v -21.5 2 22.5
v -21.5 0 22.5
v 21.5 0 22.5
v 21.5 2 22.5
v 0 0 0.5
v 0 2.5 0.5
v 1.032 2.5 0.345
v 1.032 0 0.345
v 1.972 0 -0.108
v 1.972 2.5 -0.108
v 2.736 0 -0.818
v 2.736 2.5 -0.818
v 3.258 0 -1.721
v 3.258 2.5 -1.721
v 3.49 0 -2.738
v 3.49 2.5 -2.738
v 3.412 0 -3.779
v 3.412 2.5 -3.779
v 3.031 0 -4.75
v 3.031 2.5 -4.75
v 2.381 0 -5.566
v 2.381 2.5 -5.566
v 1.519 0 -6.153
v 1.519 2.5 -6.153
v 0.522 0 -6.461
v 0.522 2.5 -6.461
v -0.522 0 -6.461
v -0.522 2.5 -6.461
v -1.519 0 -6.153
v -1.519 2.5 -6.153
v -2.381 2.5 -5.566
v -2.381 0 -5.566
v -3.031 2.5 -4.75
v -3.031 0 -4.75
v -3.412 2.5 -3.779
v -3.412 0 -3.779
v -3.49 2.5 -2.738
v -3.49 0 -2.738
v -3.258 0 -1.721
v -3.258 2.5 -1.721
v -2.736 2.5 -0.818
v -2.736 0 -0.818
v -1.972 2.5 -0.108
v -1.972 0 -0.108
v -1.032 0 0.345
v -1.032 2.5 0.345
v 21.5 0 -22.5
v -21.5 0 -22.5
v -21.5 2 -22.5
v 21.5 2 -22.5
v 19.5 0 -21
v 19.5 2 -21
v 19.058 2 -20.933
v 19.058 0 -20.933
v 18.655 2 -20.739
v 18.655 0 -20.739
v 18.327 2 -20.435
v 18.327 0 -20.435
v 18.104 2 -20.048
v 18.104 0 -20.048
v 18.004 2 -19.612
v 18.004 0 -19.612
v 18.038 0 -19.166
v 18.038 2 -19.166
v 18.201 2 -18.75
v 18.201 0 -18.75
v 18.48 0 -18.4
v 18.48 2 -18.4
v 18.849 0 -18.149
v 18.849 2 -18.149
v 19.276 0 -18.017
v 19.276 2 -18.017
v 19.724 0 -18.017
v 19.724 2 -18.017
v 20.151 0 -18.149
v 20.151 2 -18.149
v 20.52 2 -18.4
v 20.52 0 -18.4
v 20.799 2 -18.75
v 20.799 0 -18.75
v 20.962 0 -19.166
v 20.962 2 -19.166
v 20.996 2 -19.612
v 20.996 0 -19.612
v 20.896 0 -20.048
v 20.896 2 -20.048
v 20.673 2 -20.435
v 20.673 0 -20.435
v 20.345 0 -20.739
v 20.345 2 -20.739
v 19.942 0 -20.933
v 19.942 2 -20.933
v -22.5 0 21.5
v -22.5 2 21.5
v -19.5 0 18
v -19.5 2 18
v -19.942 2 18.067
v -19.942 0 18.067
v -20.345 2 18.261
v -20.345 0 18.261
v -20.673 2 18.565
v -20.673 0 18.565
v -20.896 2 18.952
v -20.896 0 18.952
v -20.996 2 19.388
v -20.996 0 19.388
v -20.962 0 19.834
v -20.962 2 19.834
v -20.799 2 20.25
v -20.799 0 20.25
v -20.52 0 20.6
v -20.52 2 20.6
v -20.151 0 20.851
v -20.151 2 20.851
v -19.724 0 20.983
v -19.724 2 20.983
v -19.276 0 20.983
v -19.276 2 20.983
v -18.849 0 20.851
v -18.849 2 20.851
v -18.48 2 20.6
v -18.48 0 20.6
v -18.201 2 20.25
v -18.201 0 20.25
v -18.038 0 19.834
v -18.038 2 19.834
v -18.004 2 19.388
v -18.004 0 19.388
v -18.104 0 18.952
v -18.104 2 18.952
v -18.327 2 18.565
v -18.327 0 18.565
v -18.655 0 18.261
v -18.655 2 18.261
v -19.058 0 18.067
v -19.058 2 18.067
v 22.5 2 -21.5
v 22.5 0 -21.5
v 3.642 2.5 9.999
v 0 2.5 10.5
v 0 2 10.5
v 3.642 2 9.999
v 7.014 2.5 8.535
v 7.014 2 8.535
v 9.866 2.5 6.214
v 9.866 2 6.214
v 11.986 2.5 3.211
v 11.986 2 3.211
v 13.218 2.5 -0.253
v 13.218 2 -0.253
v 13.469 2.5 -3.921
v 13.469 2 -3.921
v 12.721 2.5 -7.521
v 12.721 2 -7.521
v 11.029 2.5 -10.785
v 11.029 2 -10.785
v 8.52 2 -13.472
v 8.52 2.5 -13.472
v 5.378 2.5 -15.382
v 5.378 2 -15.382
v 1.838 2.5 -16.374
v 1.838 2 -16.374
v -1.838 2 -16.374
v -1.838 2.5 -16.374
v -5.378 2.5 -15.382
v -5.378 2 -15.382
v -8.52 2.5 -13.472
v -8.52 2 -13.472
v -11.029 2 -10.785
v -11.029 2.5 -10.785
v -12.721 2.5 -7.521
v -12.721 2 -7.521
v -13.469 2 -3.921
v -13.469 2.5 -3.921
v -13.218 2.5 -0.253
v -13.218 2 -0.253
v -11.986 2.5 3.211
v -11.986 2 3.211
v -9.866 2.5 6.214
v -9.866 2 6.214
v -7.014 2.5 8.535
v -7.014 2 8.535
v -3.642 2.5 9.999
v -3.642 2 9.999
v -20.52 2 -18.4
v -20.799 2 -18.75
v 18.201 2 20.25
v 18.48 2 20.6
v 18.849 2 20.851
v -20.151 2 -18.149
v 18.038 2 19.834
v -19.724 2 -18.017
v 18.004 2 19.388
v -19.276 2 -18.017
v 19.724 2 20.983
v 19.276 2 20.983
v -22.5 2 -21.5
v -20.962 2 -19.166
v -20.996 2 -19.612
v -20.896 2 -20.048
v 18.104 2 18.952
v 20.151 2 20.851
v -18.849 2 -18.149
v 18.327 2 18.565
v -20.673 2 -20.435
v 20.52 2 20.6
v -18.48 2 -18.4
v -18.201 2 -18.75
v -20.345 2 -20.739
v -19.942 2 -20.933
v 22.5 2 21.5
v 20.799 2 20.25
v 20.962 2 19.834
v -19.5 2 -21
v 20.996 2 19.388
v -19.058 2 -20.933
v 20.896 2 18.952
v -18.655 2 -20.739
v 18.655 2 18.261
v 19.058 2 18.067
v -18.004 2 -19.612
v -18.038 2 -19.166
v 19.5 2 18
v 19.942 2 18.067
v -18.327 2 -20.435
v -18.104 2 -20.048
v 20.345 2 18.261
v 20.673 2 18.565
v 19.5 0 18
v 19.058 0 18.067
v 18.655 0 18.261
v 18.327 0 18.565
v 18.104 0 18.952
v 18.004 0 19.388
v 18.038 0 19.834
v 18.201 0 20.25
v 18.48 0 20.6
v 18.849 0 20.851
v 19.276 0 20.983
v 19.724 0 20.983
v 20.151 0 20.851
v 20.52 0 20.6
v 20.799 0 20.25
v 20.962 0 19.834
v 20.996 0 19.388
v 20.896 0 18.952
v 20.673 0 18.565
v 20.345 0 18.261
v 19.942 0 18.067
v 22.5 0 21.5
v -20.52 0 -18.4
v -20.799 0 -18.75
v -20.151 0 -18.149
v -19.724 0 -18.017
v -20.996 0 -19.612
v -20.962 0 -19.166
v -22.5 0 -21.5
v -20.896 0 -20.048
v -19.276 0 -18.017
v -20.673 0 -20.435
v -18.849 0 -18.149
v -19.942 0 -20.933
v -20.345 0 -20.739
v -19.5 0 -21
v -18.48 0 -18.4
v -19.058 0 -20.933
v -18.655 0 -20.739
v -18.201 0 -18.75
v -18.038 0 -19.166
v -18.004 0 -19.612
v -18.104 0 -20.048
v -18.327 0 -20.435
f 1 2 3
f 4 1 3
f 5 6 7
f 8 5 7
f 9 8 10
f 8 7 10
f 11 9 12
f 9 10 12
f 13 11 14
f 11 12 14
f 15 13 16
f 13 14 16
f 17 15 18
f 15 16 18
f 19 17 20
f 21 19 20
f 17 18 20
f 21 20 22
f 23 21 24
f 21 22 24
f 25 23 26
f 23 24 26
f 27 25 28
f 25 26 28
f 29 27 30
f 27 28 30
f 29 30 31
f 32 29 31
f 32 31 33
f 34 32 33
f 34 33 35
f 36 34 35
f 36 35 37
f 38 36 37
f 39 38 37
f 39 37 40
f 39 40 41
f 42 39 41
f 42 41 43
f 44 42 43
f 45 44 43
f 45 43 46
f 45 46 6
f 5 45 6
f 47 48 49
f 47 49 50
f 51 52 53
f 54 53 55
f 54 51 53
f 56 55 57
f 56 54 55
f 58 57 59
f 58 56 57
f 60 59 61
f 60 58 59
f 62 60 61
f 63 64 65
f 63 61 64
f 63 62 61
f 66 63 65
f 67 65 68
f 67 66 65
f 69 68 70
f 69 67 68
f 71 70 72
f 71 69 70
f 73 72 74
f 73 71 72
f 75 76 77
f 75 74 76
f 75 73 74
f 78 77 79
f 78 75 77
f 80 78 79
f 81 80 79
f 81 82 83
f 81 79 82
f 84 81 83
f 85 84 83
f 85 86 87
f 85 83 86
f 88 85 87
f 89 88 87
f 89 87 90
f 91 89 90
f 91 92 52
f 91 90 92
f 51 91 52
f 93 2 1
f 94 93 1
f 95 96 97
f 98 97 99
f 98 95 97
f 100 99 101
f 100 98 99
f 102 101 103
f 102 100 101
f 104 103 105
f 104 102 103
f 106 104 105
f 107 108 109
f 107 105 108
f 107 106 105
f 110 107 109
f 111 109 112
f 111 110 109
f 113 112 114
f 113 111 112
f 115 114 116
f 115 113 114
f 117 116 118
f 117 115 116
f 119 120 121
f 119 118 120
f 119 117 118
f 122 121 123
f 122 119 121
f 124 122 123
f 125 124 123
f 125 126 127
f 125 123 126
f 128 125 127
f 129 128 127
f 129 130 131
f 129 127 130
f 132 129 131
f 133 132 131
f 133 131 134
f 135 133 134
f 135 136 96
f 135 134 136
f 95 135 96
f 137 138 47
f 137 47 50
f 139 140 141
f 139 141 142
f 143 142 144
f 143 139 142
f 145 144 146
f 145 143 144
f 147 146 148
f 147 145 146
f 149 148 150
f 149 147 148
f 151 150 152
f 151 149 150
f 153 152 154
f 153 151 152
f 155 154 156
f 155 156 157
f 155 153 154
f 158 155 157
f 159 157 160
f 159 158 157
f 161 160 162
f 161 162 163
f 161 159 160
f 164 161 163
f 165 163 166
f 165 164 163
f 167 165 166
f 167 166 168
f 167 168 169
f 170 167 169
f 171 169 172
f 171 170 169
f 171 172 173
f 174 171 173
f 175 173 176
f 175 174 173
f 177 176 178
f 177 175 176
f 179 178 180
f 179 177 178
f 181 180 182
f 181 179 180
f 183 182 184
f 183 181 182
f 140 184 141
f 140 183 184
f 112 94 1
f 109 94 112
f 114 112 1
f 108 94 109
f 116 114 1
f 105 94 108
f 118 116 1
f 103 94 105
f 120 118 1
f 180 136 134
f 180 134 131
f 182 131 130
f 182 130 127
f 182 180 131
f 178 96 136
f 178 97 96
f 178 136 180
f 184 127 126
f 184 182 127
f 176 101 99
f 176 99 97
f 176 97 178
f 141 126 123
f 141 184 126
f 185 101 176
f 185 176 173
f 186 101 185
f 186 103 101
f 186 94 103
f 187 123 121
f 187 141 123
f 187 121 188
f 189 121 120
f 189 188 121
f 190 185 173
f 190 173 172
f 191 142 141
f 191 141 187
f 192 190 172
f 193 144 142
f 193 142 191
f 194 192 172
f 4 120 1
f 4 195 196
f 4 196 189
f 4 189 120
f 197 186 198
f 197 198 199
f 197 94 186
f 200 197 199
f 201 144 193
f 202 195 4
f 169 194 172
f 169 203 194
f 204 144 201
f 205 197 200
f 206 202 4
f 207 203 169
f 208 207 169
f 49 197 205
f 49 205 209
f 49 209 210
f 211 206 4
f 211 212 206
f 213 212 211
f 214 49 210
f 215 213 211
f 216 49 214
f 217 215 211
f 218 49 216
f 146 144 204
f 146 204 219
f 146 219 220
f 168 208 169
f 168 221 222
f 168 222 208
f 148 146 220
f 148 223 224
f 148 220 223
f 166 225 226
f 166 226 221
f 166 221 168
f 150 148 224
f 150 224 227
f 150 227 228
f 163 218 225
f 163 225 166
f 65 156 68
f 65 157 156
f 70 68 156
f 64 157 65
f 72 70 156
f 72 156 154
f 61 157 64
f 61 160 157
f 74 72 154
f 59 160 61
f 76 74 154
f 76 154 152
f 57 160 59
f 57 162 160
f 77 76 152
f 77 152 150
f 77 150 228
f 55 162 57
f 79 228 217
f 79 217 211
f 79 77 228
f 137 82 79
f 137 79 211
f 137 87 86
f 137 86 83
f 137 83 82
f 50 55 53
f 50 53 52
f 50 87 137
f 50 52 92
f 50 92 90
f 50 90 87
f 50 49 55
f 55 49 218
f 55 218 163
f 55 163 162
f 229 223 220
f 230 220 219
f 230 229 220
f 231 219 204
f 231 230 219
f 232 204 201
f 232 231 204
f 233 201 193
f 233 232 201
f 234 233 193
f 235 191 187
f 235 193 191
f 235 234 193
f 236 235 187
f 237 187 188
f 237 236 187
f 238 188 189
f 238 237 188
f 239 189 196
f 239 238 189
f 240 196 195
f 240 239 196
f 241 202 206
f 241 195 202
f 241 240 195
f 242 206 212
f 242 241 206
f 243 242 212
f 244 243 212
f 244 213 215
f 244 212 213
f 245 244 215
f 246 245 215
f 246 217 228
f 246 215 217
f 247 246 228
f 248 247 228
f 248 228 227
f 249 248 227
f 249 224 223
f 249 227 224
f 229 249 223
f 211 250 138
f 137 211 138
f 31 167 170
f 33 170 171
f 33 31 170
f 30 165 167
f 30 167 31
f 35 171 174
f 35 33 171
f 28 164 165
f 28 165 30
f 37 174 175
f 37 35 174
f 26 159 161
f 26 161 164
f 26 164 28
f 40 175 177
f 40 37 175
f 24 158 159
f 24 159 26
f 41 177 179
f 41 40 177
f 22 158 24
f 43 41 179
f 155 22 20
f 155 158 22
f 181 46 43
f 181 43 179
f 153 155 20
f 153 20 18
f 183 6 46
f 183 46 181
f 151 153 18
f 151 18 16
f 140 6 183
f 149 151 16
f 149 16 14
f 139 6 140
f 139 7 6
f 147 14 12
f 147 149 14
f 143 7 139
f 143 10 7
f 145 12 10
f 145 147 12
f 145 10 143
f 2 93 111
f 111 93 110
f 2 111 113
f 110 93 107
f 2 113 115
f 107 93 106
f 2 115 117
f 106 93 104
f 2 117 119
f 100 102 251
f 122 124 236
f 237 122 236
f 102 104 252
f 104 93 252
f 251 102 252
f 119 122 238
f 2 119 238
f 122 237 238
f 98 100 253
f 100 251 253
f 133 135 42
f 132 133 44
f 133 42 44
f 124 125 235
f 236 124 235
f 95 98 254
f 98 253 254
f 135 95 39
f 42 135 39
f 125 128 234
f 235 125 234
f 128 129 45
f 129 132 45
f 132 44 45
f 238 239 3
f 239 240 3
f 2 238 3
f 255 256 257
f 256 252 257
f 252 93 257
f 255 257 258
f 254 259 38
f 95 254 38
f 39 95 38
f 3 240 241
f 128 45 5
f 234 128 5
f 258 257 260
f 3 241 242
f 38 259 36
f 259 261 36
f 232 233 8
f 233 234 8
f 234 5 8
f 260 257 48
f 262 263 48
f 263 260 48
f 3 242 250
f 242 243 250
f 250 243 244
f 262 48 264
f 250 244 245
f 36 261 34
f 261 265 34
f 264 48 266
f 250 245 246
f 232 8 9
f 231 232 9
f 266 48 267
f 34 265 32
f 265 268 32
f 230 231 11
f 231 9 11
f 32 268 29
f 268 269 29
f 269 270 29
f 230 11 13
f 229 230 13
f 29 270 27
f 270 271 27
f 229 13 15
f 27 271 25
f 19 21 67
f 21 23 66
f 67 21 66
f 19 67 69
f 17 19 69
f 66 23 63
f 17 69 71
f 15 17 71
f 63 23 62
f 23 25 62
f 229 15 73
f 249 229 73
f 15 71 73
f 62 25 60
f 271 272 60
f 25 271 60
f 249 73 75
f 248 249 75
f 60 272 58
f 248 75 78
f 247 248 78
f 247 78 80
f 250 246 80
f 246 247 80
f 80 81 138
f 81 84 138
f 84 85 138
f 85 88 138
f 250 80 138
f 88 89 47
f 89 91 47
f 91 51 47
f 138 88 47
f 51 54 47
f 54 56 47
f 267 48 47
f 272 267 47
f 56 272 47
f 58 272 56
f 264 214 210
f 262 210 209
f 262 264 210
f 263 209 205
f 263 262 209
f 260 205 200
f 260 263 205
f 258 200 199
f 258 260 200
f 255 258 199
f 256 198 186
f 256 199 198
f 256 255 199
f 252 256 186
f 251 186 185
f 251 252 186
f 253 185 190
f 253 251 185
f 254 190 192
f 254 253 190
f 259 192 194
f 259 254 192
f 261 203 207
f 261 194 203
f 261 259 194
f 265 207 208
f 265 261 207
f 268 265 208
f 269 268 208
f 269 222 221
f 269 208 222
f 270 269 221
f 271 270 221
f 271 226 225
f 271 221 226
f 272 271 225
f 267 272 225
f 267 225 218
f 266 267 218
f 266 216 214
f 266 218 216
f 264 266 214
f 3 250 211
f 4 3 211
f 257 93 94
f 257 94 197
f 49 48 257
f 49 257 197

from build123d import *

# Parameters (mm, degrees)
SKETCH_1_W          = 45
SKETCH_1_H          = 45
EXTRUDE_1_DEPTH     = 2
SKETCH_2_R          = 3.5
CUT_EXTRUDE_1_DEPTH = 32.882597134
EXTRUDE_START       = 0.5
SKETCH_3_R          = 13.5
SKETCH_3_R_2        = 3.5
EXTRUDE_2_DEPTH     = 0.5
SKETCH_4_R          = 1.5
CUT_EXTRUDE_4_DEPTH = 32.917863337
CHAMFER_1_SIZE      = 1


with BuildPart() as part:
    # 草图1 → 凸台-拉伸1 (new body)
    with BuildSketch(Plane(origin=(0, 0, 0), x_dir=(1, 0, 0), z_dir=(0, 1, 0))):
        Rectangle(SKETCH_1_W, SKETCH_1_H)
    extrude(amount=EXTRUDE_1_DEPTH)

    # 草图2 → 切除-拉伸1 (cut, through all)
    with BuildSketch(Plane(origin=(0, 2, 0), x_dir=(1, 0, 0), z_dir=(0, 1, 0))):
        with Locations(Location((0, 3, 0), (0, 0, 270))):
            Circle(SKETCH_2_R)
    extrude(amount=-CUT_EXTRUDE_1_DEPTH, mode=Mode.SUBTRACT)

    # 草图3 → 凸台-拉伸2 (add)
    with BuildSketch(Plane(origin=(0, 2, 0), x_dir=(1, 0, 0), z_dir=(0, 1, 0)).offset(EXTRUDE_START)):
        with Locations(Location((0, 3, 0), (0, 0, 270))):
            Circle(SKETCH_3_R)
        with Locations(Location((0, 3, 0), (0, 0, 270))):
            Circle(SKETCH_3_R_2, mode=Mode.SUBTRACT)
    extrude(amount=-EXTRUDE_2_DEPTH)

    # 草图4 → 切除-拉伸4 (cut, through all)
    with BuildSketch(Plane(origin=(0, 0, 0), x_dir=(1, 0, 0), z_dir=(0, 1, 0))):
        with Locations(Location((19.5, 19.5, 0), (0, 0, 90))):
            Circle(SKETCH_4_R)
        with Locations(Location((-19.5, 19.5, 0), (0, 0, 90))):
            Circle(SKETCH_4_R)
        with Locations(Location((-19.5, -19.5, 0), (0, 0, 90))):
            Circle(SKETCH_4_R)
        with Locations(Location((19.5, -19.5, 0), (0, 0, 90))):
            Circle(SKETCH_4_R)
    extrude(amount=CUT_EXTRUDE_4_DEPTH, mode=Mode.SUBTRACT)

    # 倒角1
    chamfer_1_edges = [part.edges().sort_by_distance(p)[0] for p in [
        (22.5, 1, 22.5),
        (-22.5, 1, 22.5),
        (-22.5, 1, -22.5),
        (22.5, 1, -22.5),
    ]]
    chamfer(chamfer_1_edges, length=CHAMFER_1_SIZE)


solid = part.part
